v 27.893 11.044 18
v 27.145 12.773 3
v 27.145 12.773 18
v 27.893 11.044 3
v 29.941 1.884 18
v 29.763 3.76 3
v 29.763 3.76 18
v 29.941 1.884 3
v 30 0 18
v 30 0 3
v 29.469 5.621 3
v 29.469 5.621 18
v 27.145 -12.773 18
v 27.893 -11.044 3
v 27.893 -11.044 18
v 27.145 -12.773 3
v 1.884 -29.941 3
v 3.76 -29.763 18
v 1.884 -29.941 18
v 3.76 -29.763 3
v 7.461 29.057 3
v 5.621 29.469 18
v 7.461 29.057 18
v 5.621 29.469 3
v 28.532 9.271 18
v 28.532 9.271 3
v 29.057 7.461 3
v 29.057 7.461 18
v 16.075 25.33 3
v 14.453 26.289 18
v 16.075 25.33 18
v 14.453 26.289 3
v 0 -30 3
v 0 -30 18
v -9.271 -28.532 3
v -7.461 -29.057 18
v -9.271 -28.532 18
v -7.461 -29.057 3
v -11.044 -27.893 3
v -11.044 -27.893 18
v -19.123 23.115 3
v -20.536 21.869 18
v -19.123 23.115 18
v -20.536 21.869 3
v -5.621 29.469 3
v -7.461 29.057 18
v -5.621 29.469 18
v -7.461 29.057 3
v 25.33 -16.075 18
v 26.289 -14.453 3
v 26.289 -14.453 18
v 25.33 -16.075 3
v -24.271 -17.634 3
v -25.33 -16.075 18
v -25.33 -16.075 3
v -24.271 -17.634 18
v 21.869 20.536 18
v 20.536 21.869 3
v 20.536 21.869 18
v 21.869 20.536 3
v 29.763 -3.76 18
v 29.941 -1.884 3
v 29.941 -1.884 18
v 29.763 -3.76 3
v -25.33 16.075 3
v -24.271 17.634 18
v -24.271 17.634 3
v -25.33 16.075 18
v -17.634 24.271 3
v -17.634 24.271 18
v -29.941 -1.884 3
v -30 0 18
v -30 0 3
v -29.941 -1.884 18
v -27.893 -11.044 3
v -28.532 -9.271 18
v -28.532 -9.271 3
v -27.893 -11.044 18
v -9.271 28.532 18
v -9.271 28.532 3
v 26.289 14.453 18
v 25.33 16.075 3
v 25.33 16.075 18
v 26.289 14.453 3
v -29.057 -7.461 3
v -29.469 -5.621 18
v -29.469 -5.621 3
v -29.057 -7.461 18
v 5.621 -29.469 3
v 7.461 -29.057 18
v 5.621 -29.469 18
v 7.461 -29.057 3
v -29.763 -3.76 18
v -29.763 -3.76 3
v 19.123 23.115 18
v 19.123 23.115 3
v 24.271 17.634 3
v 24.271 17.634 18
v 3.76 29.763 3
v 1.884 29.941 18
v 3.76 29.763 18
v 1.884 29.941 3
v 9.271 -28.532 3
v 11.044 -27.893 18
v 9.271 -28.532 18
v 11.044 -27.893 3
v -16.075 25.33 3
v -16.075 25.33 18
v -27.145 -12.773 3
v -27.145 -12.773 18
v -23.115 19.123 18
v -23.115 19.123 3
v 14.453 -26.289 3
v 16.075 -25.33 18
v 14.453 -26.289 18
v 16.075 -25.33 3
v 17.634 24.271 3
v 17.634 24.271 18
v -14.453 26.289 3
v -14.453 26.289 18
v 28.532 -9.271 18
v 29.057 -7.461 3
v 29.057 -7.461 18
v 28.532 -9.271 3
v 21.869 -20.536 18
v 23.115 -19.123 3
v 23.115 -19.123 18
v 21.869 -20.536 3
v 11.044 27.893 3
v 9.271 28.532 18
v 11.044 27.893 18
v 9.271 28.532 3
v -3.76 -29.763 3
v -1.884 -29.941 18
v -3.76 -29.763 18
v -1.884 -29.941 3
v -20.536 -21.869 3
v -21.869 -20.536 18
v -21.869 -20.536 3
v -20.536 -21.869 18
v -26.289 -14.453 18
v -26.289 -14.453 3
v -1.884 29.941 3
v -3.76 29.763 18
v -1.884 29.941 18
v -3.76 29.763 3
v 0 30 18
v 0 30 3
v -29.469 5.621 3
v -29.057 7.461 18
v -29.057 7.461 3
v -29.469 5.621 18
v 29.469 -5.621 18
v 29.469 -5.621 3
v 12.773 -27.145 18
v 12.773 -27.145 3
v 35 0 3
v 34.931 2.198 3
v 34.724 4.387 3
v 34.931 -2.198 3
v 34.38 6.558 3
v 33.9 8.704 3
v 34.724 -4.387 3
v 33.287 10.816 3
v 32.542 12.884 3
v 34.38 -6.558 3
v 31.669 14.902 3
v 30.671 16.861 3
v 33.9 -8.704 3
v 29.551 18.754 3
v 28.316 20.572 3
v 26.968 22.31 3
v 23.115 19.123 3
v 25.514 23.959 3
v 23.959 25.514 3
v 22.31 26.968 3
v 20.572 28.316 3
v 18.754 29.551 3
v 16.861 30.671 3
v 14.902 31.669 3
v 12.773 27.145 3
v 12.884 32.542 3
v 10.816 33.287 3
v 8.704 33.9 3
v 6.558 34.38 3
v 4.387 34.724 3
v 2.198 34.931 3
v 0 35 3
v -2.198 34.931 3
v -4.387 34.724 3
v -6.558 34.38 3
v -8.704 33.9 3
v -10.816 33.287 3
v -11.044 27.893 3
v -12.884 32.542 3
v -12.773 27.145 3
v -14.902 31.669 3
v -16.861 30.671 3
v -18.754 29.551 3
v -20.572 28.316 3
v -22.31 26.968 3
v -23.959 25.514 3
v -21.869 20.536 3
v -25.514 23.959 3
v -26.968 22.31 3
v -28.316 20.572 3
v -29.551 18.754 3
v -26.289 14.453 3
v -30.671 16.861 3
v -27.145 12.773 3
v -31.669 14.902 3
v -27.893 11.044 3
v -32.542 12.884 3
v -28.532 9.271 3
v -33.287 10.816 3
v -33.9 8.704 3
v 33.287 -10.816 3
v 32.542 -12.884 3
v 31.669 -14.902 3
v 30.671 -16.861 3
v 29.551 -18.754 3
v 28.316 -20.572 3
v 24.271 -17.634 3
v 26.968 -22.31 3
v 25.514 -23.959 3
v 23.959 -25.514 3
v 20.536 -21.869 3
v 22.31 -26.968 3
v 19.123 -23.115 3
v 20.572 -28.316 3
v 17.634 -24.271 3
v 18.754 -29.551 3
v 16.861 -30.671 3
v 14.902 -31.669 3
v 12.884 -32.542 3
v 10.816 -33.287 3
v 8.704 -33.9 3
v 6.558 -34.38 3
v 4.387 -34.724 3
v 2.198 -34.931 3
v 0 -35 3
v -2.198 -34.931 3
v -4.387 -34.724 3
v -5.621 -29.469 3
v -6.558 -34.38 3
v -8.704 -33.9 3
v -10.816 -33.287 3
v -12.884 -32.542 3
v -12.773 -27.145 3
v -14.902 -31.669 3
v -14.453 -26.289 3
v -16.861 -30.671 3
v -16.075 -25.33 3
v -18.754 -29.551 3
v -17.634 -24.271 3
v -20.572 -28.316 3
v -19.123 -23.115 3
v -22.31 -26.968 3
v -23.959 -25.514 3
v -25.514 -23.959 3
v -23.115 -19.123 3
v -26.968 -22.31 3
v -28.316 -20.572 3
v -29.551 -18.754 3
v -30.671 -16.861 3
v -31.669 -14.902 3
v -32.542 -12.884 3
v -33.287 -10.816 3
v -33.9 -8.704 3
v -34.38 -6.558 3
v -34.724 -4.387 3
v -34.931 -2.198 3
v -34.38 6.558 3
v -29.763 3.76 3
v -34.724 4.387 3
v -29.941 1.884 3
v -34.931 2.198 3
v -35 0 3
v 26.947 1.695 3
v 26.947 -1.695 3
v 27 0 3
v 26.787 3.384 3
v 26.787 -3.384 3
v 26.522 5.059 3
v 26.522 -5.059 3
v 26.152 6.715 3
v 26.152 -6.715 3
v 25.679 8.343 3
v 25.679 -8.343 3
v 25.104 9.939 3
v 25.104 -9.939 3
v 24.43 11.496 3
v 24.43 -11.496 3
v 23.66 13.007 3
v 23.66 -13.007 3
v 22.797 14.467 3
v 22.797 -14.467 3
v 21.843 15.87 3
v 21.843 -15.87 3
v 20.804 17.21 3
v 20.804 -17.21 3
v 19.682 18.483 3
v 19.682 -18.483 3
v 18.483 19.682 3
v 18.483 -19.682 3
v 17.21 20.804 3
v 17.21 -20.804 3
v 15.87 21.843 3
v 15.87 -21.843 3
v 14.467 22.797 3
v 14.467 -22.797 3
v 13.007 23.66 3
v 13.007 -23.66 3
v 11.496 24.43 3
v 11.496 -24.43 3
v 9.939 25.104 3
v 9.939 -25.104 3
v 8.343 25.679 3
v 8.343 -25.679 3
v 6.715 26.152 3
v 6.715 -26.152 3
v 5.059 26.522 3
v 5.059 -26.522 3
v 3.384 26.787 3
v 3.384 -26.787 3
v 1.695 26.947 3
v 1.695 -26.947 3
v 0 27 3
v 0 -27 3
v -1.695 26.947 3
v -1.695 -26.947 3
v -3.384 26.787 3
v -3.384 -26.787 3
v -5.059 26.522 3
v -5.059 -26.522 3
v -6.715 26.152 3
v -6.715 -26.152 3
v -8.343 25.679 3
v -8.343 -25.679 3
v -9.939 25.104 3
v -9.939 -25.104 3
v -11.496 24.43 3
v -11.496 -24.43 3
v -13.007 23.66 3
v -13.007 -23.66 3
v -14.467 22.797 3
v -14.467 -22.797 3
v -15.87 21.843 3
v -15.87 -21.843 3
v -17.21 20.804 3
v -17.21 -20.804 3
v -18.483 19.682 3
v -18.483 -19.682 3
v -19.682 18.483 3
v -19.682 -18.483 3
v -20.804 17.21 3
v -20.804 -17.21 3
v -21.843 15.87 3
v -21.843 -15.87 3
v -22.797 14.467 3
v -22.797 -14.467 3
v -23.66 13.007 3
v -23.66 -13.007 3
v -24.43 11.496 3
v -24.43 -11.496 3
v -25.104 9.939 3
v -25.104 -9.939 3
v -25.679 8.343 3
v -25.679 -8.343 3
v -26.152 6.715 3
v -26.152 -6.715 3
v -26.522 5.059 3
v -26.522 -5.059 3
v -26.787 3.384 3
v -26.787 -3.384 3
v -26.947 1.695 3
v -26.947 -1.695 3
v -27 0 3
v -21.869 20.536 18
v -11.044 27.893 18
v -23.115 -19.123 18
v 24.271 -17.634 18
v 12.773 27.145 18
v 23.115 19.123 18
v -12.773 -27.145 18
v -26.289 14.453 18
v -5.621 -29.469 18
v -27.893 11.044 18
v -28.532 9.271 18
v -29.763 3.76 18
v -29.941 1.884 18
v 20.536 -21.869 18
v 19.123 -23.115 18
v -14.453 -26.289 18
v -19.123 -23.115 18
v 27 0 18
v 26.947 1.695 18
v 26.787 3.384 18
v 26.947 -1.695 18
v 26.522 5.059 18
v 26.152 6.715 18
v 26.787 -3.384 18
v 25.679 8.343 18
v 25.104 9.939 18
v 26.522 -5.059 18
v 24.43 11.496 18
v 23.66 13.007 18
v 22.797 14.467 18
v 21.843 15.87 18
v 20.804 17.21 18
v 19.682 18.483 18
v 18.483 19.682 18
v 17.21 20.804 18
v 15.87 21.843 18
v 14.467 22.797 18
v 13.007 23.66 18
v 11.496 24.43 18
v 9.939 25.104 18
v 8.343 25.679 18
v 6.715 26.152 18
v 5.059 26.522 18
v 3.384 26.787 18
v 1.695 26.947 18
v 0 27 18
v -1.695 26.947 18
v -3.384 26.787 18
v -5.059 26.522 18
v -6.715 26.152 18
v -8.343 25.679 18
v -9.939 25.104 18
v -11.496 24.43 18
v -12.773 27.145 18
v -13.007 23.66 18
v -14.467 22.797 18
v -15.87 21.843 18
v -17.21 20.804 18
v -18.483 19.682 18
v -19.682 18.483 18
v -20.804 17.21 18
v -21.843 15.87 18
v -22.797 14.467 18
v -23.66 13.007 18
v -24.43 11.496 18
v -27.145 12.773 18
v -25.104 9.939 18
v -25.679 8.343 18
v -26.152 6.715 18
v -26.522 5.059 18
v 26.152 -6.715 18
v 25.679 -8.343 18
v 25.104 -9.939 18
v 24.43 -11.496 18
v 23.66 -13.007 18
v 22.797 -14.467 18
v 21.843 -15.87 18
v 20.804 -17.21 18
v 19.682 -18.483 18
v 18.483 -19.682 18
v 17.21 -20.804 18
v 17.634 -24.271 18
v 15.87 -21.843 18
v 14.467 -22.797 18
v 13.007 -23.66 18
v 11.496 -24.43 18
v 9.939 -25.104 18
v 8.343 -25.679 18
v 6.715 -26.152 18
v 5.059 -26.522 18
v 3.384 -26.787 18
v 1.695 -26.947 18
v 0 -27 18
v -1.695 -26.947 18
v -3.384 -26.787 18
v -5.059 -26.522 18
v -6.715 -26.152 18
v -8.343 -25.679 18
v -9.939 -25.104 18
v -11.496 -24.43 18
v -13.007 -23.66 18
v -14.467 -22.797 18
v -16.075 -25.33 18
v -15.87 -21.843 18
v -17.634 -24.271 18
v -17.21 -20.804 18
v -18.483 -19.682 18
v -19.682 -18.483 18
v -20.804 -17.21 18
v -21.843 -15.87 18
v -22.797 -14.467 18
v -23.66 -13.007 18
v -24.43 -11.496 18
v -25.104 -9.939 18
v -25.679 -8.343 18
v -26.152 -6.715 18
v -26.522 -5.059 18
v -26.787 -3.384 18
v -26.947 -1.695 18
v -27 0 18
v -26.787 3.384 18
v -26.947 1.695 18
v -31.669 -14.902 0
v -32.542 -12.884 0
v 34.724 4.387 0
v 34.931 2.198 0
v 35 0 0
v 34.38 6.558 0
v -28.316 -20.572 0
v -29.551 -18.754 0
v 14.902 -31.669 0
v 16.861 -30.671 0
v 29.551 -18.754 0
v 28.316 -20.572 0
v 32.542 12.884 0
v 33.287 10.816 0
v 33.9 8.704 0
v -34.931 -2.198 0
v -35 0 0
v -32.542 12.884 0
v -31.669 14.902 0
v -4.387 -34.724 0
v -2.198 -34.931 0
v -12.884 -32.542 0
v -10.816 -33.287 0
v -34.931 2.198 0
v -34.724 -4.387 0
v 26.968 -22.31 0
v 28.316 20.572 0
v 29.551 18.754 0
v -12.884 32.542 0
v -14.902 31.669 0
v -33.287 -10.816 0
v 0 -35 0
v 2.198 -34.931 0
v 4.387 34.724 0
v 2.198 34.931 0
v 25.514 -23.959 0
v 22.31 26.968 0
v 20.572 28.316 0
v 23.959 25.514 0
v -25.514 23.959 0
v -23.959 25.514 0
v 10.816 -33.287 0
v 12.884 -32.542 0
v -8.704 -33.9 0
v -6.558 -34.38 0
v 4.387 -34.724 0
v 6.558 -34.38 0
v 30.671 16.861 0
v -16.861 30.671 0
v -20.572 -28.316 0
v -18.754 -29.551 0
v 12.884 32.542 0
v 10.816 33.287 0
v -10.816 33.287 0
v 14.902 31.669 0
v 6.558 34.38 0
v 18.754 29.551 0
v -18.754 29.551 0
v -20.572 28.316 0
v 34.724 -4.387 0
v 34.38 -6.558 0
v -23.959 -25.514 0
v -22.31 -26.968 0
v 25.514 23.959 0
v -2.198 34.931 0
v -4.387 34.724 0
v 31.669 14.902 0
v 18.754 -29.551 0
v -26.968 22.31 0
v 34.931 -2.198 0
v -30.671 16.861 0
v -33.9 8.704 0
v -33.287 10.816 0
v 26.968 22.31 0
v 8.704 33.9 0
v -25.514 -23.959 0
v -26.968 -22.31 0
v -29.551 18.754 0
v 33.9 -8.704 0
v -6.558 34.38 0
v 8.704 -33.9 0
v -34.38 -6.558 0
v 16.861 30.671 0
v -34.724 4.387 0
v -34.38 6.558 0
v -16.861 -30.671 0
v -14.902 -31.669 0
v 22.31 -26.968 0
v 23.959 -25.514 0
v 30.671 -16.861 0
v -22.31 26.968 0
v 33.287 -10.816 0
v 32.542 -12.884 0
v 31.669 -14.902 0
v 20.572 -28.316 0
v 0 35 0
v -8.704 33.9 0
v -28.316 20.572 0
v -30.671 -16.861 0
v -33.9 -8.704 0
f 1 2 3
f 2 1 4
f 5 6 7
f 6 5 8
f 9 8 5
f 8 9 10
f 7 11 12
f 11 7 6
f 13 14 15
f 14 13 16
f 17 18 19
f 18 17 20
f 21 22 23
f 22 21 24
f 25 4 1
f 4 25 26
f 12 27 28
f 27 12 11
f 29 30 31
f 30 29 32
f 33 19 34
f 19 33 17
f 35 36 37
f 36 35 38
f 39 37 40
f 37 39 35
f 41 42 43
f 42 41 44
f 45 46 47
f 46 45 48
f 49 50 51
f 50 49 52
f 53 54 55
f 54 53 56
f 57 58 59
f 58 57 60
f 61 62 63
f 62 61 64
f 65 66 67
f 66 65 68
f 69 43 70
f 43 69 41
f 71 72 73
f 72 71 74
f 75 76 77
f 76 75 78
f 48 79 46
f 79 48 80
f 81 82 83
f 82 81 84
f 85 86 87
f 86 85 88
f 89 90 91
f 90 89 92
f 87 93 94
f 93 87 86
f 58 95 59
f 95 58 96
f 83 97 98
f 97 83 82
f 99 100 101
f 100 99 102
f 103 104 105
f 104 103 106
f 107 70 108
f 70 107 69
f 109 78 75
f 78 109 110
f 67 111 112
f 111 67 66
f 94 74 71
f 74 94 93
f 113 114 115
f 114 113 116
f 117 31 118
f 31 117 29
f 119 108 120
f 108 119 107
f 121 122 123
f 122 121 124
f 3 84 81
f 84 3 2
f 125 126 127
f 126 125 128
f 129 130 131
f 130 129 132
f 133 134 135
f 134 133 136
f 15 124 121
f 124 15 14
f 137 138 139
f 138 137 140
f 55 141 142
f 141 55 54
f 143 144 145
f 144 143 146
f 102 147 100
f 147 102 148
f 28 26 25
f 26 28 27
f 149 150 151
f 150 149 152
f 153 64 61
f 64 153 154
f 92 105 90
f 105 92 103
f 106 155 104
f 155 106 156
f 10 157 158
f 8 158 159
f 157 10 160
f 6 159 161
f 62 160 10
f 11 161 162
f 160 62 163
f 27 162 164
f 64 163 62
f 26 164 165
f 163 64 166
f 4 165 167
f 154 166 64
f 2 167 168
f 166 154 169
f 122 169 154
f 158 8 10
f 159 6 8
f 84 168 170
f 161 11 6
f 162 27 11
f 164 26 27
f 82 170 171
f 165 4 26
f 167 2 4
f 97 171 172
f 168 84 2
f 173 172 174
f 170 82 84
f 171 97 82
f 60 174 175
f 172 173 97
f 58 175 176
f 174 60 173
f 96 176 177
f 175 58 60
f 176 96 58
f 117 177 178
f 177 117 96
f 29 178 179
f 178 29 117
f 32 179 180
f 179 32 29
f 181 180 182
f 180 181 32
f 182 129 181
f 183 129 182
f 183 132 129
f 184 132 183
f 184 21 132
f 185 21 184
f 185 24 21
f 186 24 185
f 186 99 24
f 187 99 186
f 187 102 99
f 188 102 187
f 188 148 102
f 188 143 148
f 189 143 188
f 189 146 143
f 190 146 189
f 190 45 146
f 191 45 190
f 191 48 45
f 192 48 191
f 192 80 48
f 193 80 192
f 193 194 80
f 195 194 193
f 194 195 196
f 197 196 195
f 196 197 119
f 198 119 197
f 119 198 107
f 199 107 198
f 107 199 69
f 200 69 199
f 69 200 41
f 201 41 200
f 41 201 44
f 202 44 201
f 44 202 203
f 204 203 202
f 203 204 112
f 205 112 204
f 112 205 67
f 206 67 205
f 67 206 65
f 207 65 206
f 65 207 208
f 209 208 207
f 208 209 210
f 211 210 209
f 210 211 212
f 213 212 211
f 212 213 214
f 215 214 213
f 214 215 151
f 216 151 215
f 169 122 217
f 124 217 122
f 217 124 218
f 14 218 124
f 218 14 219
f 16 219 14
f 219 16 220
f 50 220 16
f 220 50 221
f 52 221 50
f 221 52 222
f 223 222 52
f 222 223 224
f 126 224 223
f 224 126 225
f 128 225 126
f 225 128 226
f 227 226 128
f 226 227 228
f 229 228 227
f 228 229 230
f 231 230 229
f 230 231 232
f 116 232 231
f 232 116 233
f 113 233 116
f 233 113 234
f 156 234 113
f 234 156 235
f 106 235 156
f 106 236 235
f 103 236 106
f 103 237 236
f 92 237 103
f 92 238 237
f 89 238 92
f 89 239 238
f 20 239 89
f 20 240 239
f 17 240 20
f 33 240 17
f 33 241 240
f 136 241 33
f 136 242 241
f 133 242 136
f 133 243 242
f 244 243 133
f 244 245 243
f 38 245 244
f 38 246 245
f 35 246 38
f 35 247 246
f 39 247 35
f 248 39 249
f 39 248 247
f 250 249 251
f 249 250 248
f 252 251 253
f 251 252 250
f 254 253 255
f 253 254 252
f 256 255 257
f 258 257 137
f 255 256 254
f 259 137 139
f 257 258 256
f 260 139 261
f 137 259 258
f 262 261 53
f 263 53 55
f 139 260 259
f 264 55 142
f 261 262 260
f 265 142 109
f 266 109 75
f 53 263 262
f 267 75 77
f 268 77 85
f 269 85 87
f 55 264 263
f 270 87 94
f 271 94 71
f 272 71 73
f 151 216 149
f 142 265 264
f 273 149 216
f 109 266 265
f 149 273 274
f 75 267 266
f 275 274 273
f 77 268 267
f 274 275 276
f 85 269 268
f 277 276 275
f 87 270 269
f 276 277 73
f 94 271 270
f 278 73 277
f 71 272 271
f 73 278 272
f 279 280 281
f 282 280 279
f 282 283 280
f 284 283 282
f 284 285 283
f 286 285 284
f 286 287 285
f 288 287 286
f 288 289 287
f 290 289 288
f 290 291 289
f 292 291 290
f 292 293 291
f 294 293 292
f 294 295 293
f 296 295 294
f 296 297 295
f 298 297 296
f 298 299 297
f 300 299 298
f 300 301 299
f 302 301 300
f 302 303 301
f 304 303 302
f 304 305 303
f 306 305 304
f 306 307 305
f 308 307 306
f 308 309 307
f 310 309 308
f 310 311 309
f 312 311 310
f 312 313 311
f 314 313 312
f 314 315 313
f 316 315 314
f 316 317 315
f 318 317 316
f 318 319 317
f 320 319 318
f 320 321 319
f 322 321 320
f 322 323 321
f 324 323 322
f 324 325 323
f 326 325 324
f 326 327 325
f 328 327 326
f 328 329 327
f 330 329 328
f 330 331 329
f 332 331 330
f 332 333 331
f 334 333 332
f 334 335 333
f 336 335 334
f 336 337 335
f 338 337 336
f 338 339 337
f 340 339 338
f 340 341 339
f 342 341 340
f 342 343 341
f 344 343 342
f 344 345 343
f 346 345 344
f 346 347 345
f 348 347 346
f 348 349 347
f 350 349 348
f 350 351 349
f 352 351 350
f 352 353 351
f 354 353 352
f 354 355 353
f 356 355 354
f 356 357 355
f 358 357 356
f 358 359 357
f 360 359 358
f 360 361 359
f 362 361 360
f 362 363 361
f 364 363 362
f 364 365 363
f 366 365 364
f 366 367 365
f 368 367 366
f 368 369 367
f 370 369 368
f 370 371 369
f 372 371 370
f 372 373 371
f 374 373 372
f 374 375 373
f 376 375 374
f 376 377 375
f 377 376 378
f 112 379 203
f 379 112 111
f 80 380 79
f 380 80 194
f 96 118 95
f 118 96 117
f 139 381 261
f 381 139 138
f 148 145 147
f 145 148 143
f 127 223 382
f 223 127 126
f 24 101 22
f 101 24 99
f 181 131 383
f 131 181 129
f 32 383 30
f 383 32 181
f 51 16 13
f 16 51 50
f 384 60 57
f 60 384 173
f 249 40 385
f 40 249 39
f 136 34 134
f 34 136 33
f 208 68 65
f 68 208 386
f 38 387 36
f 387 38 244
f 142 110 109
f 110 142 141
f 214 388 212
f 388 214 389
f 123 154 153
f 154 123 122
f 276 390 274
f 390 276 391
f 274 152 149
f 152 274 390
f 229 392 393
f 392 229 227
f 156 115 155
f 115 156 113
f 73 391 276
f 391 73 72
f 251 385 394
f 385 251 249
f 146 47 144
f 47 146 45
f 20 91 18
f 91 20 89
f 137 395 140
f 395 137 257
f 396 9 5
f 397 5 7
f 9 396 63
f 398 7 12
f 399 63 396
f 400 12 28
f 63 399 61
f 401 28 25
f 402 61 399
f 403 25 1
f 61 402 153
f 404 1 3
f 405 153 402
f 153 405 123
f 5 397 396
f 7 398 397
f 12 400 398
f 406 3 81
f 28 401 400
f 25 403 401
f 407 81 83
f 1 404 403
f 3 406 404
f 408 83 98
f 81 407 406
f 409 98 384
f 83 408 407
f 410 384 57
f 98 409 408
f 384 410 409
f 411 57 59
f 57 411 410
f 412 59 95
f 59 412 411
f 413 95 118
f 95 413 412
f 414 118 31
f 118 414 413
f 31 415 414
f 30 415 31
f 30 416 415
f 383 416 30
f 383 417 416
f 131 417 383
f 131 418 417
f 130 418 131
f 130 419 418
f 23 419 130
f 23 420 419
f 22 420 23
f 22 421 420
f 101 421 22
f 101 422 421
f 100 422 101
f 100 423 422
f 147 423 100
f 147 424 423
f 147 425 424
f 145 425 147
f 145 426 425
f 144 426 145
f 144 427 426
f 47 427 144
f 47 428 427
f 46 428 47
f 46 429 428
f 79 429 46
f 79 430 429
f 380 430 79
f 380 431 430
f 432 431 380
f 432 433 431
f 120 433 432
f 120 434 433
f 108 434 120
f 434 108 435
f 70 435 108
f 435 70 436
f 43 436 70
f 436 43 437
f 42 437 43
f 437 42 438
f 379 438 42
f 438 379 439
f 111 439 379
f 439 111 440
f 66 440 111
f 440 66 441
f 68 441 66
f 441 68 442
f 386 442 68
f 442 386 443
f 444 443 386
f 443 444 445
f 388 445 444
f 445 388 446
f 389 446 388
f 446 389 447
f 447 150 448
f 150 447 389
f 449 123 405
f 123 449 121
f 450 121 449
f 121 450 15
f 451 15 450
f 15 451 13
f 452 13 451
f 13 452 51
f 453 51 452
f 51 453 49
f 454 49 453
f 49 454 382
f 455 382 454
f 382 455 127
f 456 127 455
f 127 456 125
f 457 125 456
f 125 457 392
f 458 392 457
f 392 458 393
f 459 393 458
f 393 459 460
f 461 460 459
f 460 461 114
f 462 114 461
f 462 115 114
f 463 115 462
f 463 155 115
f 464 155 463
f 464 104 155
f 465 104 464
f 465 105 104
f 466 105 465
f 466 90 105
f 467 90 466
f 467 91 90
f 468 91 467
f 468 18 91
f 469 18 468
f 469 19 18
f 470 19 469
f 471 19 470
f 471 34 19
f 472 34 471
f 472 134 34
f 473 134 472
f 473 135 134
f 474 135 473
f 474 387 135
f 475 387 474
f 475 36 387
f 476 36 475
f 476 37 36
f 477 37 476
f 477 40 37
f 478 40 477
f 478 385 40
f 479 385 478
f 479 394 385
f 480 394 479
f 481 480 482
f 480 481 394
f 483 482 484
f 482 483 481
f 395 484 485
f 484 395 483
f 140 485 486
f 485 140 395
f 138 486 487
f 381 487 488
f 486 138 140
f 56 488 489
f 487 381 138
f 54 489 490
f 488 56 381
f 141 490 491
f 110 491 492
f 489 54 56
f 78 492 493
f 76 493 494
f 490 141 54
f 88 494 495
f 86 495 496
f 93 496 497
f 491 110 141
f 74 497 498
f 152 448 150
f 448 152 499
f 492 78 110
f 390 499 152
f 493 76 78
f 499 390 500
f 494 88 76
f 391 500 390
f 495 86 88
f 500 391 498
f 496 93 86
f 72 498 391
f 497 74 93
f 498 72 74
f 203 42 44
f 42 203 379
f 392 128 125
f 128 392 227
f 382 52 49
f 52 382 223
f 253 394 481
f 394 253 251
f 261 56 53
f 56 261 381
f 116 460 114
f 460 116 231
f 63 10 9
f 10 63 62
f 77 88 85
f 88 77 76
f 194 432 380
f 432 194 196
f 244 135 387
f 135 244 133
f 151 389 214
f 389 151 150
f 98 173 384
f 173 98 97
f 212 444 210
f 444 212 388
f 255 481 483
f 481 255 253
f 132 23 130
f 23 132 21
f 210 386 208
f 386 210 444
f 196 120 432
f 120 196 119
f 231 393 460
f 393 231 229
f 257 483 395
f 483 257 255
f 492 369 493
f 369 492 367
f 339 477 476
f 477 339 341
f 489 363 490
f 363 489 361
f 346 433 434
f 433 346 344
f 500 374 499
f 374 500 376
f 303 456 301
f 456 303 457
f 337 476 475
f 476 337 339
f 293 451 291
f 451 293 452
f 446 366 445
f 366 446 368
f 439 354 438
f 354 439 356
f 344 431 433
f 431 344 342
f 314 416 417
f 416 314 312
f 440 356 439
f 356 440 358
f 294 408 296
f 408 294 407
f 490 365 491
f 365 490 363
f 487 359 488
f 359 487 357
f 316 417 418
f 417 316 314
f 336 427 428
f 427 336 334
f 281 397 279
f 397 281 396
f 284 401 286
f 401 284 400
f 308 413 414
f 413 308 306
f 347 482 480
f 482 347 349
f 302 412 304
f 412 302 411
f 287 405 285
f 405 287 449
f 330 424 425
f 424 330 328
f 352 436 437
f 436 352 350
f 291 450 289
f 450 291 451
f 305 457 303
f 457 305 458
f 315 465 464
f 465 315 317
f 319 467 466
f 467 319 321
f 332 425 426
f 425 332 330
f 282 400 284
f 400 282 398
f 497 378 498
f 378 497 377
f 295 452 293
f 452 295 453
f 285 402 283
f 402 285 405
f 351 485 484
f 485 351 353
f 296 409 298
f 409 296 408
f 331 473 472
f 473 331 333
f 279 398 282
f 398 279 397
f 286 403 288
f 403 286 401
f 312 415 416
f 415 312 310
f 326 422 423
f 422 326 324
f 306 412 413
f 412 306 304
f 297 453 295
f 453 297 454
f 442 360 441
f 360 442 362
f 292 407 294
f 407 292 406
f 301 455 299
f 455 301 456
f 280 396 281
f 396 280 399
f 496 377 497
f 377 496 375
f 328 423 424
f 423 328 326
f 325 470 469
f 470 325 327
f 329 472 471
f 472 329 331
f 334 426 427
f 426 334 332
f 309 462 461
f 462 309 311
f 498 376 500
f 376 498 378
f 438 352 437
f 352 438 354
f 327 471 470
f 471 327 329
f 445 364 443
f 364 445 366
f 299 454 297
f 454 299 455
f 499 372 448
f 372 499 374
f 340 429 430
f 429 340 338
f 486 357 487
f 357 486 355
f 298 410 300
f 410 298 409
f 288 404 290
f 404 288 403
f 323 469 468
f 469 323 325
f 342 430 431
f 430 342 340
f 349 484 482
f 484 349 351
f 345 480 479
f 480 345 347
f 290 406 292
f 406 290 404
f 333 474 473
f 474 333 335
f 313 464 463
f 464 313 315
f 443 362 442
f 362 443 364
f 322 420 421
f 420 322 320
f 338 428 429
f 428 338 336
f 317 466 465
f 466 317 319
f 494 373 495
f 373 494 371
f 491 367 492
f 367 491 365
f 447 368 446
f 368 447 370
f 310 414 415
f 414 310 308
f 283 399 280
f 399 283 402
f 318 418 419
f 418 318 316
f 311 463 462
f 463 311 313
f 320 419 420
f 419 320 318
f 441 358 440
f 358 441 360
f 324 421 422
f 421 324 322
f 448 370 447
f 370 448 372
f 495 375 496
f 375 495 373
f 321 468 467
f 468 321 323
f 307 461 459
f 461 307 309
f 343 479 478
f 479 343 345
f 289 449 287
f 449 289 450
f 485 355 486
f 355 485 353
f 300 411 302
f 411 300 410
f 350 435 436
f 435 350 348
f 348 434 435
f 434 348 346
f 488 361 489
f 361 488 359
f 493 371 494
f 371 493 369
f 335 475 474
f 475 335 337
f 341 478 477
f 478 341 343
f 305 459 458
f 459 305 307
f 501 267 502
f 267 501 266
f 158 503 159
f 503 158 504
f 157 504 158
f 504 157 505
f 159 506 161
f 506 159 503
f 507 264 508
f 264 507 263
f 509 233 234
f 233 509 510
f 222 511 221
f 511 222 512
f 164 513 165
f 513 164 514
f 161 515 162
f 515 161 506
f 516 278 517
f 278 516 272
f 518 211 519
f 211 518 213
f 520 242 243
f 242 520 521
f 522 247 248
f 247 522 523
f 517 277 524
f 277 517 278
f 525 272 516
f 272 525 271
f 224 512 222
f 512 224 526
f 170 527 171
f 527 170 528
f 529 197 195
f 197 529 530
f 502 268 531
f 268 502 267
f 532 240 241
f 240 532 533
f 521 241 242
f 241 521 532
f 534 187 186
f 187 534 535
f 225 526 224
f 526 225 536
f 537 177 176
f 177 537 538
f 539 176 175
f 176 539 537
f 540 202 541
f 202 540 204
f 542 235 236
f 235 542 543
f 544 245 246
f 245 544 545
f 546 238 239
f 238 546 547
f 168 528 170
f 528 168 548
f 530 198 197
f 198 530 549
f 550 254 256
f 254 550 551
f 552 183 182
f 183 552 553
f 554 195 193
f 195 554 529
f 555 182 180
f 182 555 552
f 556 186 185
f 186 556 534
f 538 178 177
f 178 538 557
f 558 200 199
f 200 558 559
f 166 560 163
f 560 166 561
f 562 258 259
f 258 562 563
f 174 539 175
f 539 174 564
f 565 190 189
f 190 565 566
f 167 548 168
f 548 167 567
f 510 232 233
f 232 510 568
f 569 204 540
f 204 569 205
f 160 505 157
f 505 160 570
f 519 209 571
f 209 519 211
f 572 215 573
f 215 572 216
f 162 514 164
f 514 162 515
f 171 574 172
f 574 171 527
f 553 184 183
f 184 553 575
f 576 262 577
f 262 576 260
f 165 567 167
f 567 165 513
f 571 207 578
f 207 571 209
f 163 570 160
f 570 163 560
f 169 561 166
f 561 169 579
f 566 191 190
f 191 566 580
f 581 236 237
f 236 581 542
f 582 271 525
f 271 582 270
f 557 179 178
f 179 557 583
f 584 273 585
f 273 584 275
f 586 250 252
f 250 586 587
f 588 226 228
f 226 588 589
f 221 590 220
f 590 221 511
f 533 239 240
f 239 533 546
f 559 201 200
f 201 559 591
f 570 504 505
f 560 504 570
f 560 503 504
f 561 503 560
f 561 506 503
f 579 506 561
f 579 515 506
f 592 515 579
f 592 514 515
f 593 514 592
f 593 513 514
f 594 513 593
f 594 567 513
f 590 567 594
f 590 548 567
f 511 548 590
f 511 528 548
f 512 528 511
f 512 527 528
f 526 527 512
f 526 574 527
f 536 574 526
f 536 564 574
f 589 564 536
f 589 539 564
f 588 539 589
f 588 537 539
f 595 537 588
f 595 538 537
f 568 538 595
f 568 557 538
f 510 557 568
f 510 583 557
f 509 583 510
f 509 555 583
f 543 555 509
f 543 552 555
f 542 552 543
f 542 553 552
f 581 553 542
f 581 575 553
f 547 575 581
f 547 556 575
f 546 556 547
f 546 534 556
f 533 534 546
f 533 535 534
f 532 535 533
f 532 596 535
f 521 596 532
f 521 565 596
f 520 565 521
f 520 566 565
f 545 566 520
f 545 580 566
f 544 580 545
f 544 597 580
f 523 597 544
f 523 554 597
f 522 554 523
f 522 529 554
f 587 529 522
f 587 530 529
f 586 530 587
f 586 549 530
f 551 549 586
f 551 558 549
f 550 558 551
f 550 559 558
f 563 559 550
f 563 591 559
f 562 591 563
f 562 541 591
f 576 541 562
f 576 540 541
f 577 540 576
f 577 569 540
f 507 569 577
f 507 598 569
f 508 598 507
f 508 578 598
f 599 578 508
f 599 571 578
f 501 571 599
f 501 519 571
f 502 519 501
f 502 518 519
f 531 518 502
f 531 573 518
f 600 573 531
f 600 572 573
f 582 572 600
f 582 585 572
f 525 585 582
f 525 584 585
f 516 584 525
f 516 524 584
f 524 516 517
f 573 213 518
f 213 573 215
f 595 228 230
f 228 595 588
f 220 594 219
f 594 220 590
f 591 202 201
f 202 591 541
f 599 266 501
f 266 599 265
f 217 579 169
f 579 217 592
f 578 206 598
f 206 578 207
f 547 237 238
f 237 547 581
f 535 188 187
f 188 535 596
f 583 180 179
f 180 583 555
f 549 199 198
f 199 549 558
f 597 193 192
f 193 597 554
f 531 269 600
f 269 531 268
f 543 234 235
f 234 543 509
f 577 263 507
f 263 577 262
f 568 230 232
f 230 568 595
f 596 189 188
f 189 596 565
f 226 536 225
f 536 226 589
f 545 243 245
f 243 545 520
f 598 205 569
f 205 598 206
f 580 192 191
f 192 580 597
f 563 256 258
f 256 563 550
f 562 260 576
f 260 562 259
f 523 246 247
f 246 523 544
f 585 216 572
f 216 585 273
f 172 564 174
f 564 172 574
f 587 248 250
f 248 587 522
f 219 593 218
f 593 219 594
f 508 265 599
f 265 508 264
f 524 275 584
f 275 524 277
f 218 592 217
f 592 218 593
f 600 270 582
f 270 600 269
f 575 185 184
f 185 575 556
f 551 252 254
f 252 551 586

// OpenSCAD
// Parametric end-cap
// Mark Reid
// Nov 29, 2012

// cylinder quality
cq = 100;

thickness = 3;
cap_diameter = 70;
outer_diameter = 60;
cap_height = 15;

cap_radius = cap_diameter / 2;
outer_radius = outer_diameter / 2;
inner_radius = outer_radius - thickness;

cylinder(r=cap_radius, h=thickness, $fn=cq);

translate([0,0,thickness])
 difference() {
   cylinder(r=outer_radius, h=cap_height, $fn=cq);
   cylinder(r=inner_radius, h=cap_height+1, $fn=cq);
 }
